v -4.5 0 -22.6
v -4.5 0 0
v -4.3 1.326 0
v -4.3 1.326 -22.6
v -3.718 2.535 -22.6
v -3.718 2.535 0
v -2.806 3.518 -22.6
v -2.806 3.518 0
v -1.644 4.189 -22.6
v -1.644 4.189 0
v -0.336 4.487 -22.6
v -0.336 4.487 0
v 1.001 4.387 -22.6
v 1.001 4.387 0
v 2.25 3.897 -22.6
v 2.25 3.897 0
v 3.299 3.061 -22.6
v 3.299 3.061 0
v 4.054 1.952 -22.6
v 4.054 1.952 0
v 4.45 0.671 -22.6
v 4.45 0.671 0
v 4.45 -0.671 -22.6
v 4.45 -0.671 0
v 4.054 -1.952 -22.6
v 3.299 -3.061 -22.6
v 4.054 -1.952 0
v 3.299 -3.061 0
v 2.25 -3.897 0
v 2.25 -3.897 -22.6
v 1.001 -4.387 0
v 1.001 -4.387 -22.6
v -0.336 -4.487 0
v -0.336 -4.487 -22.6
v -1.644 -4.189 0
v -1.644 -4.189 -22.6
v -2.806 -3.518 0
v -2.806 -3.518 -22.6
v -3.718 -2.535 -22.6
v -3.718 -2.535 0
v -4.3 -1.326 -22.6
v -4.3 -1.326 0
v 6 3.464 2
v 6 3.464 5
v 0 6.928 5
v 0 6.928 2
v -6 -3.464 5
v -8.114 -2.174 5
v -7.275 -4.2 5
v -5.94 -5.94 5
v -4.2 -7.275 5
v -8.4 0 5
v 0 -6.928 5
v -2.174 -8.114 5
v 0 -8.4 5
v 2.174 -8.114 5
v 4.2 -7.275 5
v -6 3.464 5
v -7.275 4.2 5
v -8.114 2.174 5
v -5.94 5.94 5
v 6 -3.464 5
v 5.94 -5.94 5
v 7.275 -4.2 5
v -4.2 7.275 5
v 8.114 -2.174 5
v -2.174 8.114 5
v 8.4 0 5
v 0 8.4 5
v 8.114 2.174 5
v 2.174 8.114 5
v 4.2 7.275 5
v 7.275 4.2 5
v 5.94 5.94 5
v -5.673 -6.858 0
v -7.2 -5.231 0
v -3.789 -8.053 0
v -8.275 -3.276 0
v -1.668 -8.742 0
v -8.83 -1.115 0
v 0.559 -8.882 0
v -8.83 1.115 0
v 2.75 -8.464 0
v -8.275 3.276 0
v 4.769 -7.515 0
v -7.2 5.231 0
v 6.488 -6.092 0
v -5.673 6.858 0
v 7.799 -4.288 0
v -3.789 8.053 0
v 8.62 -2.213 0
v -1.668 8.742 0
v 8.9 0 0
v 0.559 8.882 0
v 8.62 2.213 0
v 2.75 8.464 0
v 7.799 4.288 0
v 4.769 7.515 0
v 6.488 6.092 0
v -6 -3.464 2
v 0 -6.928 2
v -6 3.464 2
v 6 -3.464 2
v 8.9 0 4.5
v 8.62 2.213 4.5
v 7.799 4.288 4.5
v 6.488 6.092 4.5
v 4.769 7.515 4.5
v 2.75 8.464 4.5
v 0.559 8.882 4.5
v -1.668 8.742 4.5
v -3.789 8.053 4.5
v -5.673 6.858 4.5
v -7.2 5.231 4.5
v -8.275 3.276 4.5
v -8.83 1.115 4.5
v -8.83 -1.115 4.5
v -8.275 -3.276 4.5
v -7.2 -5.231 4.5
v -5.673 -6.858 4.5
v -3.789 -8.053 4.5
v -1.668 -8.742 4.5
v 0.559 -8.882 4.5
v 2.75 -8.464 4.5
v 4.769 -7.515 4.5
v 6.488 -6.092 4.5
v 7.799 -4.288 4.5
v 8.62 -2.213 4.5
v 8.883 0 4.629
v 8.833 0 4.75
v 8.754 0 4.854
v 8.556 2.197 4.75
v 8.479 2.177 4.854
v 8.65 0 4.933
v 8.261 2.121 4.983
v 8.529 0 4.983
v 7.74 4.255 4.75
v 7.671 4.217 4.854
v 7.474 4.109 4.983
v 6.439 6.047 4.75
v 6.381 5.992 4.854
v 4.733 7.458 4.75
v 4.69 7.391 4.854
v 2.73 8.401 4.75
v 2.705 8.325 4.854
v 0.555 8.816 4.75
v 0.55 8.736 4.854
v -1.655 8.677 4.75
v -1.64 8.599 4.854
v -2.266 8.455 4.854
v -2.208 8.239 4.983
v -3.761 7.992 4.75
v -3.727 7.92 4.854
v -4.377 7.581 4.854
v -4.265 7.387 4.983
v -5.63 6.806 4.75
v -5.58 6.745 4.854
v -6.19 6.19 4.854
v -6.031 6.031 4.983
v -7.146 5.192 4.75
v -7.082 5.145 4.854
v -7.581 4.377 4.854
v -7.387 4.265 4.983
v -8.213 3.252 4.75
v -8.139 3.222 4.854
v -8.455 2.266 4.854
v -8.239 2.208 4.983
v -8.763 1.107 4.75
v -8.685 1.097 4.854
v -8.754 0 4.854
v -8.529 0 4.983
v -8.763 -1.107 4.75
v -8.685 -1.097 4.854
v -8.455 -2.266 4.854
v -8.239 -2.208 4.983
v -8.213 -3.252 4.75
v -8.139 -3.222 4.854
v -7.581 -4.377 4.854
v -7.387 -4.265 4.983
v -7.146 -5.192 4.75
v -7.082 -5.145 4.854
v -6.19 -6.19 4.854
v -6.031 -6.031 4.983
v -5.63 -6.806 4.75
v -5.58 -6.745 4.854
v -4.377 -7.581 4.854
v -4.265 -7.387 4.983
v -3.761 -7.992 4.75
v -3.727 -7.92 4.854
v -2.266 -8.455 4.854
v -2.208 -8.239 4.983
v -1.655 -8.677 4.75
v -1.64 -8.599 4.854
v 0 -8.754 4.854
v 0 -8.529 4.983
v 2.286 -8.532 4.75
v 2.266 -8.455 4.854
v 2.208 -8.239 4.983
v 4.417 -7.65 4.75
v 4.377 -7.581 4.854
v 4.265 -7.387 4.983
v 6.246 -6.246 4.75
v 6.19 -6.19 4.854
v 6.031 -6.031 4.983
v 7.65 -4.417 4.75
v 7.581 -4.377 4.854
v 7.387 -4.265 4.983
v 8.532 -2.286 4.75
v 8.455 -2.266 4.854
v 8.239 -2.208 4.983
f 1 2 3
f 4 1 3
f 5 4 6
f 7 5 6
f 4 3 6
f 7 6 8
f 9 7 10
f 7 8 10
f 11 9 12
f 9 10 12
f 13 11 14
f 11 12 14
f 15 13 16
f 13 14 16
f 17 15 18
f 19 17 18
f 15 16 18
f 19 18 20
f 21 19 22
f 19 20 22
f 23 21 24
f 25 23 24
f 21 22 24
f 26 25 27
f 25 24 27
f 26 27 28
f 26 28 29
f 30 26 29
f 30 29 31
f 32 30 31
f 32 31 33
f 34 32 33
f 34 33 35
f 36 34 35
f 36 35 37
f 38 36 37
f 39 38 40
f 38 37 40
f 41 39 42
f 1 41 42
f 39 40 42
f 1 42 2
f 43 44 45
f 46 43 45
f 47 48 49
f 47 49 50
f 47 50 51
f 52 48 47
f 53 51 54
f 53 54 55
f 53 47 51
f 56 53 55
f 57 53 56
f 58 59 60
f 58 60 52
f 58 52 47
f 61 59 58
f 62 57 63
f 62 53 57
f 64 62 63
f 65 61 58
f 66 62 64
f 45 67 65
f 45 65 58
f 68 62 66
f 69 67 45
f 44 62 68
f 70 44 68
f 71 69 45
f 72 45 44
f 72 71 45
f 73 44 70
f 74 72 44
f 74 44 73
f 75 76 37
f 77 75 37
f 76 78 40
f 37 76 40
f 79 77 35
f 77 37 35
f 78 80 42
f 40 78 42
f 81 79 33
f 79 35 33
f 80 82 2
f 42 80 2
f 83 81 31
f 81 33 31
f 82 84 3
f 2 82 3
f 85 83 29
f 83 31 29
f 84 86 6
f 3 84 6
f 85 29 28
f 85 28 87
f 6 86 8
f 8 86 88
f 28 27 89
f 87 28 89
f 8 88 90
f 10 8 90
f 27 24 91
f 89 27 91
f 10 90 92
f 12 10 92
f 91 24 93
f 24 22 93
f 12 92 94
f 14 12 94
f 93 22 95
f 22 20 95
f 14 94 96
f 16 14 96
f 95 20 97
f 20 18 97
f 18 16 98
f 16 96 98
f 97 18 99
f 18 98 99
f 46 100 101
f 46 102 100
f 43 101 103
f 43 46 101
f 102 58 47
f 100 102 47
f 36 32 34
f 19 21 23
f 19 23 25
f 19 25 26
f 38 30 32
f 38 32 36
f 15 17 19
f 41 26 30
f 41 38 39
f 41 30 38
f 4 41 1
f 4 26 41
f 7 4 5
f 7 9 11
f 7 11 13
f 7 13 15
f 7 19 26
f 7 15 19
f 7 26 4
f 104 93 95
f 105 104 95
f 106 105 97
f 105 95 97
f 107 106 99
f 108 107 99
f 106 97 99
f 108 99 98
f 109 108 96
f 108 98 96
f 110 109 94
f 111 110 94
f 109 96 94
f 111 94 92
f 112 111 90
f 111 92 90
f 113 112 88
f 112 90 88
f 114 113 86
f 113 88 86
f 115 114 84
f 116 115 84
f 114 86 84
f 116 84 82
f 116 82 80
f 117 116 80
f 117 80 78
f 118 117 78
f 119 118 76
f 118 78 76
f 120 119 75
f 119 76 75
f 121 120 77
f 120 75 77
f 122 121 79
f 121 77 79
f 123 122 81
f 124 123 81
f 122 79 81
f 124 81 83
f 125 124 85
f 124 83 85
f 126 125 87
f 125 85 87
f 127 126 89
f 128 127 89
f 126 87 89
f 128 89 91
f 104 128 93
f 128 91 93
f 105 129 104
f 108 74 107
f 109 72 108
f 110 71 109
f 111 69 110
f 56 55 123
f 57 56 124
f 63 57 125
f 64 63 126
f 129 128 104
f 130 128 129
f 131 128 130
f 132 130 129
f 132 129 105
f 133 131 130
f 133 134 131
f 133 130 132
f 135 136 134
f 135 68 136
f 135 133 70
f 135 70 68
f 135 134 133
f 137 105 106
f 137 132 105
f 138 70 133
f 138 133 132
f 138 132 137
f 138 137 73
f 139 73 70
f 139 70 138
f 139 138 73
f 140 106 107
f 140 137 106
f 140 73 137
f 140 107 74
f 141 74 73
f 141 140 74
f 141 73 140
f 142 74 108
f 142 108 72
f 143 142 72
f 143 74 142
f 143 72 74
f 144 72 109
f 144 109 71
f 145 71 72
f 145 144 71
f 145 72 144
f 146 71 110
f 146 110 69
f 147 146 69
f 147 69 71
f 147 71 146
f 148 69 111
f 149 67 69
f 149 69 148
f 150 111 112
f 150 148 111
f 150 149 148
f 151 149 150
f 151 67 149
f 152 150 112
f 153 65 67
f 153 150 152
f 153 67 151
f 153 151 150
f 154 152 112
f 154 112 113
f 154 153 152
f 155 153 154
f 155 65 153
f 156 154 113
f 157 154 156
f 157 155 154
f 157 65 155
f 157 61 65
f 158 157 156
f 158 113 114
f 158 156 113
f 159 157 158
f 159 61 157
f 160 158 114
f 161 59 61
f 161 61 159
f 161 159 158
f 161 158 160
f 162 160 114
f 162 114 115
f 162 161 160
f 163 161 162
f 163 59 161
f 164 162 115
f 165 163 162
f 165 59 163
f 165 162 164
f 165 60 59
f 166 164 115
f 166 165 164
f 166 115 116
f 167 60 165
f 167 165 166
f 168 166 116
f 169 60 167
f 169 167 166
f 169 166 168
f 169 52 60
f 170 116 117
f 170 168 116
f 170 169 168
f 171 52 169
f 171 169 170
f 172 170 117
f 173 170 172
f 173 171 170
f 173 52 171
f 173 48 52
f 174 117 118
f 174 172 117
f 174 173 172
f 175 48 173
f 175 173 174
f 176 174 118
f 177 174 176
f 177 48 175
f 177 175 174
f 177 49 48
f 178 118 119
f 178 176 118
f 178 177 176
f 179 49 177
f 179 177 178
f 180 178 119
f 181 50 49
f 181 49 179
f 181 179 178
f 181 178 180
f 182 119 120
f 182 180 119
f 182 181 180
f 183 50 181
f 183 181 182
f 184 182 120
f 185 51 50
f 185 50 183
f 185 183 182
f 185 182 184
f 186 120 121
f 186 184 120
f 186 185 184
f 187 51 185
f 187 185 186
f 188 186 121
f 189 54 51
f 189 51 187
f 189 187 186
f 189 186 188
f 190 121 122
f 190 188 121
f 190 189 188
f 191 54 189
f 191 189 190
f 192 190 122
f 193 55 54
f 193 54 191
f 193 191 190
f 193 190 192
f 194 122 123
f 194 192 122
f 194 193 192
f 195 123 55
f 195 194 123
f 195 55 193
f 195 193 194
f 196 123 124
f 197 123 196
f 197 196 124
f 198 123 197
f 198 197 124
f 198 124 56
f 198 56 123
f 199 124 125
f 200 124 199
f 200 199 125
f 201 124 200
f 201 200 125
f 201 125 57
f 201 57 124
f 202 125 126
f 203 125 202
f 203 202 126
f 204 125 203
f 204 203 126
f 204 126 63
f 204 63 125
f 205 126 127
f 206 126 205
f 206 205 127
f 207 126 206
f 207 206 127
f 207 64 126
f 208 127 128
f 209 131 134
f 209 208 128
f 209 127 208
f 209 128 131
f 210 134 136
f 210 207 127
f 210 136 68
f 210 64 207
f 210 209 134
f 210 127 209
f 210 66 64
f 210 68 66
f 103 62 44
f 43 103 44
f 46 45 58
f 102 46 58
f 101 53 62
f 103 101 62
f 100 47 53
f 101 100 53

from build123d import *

# Parameters (mm, degrees)
CROQUIS1_R              = 8.9
SALIENTE_EXTRUIR1_DEPTH = 5
CORTAR_EXTRUIR1_DEPTH   = 3
REDONDEO1_R             = 0.5
CROQUIS3_R              = 4.5
SALIENTE_EXTRUIR2_DEPTH = 22.6


with BuildPart() as part:
    # Croquis1 → Saliente-Extruir1 (new body)
    with BuildSketch(Plane.XY):
        Circle(CROQUIS1_R)
    extrude(amount=SALIENTE_EXTRUIR1_DEPTH)

    # Croquis2 → Cortar-Extruir1 (cut)
    with BuildSketch(Plane.XY.offset(5)):
        Polygon((-6, -3.464101615), (0, -6.92820323), (6, -3.464101615), (6, 3.464101615), (0, 6.92820323), (-6, 3.464101615), align=None)
    extrude(amount=-CORTAR_EXTRUIR1_DEPTH, mode=Mode.SUBTRACT)

    # Redondeo1
    redondeo1_edges = [part.edges().sort_by_distance(p)[0] for p in [
        (-8.9, 0, 5),
    ]]
    fillet(redondeo1_edges, radius=REDONDEO1_R)

    # Croquis3 → Saliente-Extruir2 (add)
    with BuildSketch(Plane(origin=(0, 0, 0), x_dir=(-1, 0, 0), z_dir=(0, 0, -1))):
        Circle(CROQUIS3_R)
    extrude(amount=SALIENTE_EXTRUIR2_DEPTH)


solid = part.part
